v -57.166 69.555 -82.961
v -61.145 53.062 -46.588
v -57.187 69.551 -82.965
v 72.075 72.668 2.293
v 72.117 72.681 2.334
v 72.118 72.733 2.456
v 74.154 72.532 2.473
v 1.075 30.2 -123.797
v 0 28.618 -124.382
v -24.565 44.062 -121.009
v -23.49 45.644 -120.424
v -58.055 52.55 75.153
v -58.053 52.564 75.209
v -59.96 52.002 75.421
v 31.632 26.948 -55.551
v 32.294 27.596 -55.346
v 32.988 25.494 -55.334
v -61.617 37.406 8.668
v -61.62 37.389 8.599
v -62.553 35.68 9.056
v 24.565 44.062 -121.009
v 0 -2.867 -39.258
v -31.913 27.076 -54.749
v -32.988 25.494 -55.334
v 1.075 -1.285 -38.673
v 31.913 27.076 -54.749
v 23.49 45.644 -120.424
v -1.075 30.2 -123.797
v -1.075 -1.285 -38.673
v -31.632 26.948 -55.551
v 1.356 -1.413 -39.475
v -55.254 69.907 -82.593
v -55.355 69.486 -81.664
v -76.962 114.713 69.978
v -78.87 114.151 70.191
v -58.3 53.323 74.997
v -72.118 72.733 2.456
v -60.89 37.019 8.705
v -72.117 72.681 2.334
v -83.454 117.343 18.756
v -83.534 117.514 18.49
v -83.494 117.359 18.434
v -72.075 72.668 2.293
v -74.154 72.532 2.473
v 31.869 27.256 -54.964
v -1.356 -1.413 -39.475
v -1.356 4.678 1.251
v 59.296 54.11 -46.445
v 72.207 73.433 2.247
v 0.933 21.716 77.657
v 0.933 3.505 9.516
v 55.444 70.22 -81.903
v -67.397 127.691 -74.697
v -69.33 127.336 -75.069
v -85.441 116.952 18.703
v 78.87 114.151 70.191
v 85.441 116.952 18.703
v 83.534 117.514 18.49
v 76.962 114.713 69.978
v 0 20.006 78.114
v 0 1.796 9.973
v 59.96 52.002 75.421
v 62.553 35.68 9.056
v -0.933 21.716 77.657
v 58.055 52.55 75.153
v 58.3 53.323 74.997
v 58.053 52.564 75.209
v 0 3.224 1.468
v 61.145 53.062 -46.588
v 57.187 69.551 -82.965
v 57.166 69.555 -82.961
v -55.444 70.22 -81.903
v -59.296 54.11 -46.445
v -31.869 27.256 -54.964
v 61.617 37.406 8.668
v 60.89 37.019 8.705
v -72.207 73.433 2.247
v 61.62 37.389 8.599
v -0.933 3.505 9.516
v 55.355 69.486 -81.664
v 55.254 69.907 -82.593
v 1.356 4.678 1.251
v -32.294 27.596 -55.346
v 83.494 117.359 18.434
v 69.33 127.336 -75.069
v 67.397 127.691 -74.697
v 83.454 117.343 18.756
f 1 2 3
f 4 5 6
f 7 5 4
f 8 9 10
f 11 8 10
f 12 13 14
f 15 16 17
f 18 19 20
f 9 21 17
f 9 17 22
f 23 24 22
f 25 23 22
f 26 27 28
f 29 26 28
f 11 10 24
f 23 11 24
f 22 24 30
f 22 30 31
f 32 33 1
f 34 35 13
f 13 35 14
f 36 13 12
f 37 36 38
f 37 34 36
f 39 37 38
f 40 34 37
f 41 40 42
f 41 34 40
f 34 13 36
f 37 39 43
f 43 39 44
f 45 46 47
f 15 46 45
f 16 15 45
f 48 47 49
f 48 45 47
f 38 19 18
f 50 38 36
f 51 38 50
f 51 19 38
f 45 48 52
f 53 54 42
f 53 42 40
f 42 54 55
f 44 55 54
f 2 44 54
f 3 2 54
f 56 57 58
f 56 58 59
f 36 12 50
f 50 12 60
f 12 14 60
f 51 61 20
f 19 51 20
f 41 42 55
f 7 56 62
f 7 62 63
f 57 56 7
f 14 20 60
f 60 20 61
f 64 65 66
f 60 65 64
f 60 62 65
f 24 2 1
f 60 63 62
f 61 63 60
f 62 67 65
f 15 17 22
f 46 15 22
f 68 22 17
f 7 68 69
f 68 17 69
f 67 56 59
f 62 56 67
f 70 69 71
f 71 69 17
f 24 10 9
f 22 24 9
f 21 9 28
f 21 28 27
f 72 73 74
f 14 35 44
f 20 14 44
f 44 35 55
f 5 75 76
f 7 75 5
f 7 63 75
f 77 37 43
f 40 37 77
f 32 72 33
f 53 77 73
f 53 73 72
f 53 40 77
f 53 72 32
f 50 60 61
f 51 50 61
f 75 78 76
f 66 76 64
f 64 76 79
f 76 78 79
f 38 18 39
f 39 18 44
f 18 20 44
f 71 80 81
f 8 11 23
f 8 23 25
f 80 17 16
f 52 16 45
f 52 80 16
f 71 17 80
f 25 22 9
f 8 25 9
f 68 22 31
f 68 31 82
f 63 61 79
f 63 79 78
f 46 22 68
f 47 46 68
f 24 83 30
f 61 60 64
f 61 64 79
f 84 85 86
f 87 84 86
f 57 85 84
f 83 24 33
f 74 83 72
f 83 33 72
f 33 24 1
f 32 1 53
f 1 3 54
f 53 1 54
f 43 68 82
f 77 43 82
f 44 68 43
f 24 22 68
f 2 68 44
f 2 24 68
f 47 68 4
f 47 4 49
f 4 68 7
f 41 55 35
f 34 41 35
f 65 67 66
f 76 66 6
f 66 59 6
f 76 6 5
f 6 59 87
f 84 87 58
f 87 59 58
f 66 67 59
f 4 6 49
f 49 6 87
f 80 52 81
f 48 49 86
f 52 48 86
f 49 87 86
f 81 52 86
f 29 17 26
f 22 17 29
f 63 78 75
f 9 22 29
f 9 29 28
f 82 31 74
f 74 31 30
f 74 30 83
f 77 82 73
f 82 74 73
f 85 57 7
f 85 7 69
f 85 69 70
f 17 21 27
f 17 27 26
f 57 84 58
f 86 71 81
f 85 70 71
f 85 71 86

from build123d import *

# Parameters (mm, degrees)
BOSS_EXTRUDE1_DEPTH  = 2
BOSS_EXTRUDE2_DEPTH  = 2
BOSS_EXTRUDE3_DEPTH  = 2
BOSS_EXTRUDE4_DEPTH  = 2
BOSS_EXTRUDE5_DEPTH  = 2
BOSS_EXTRUDE11_DEPTH = 2


with BuildPart() as part:
    # Sketch3 → Boss-Extrude1 (new body)
    with BuildSketch(Plane(origin=(-0.346555838, -0.635169439, 0.169748229), x_dir=(0.8846275482433851, -0.4504883576630665, 0.12039244369531933), z_dir=(0.4662982960390243, 0.8546340716593914, -0.22839987449644675))):
        Polygon((-67.388202535, -86.290405408), (0.391753387, -80.63091609), (0.391753387, -10.098482667), (-70.319042991, -17.961416408), align=None)
    extrude(amount=BOSS_EXTRUDE1_DEPTH)



with BuildPart() as body_2:
    # Sketch5 → Boss-Extrude2 (new body)
    with BuildSketch(Plane(origin=(-56.35451769, -10.362612727, -10.830227939), x_dir=(0.18266051002357656, 0.033588081371868986, -0.9826021467856071), z_dir=(0.9663996352281745, 0.17770403455896827, 0.18572296877962188))):
        Polygon((-30.056447866, 130.475360148), (-13.538590304, 84.746354353), (36.390477752, 63.245242789), (73.411523815, 78.746769275), (65.375780796, 137.774420808), align=None)
    extrude(amount=BOSS_EXTRUDE2_DEPTH)


with BuildPart() as part_1:
    add(part.part)

    add(body_2.part)  # Boss-Extrude3 merges body 2
    # Sketch4 → Boss-Extrude3 (add)
    with BuildSketch(Plane(origin=(-48.24629982, -14.226608827, 5.383644926), x_dir=(0.10207726427725161, 0.030099993458726118, 0.994320985653756), z_dir=(-0.9537215923741782, -0.28122828227388286, 0.10642263616610528))):
        Polygon((65.177713076, 131.796906654), (70.437801909, 66.837017039), (3.69362899, 51.915356778), (-2.927449999, 90.54331453), (13.395731887, 136.34217175), align=None)
    extrude(amount=-BOSS_EXTRUDE3_DEPTH)

    # Sketch6 → Boss-Extrude4 (add)
    with BuildSketch(Plane(origin=(1.480799375, 1.587783801, -0.237470014), x_dir=(-0.7350655060210773, 0.6705381368478288, -0.10028613508666168), z_dir=(-0.6779960928043596, -0.7269797866087502, 0.10872758621582002))):
        Polygon((102.895181545, -13.174165852), (85.198045027, 38.226427476), (46.892200114, 50.954167672), (2.014513485, 39.25021901), (2.014513485, -1.928751345), align=None)
    extrude(amount=-BOSS_EXTRUDE4_DEPTH)

    # Sketch7 → Boss-Extrude5 (add)
    with BuildSketch(Plane(origin=(-19.399997247, -16.733859342, -9.71050635), x_dir=(0.26837311265933295, 0.23149064719993817, -0.9350871363998624), z_dir=(0.7080687682639505, 0.610759013089178, 0.3544178992933416))):
        Polygon((78.334992527, 90.006984524), (39.437055345, 80.117286778), (48.790397505, 40.850912927), align=None)
    extrude(amount=BOSS_EXTRUDE5_DEPTH)


with BuildPart() as body_2_2:
    # Sketch9 → Boss-Extrude11 (new body)
    with BuildSketch(Plane(origin=(-7.391063933, -10.877406216, -4.023277357), x_dir=(-0.8433068557681762, 0.5040578599076407, 0.1864382495083074), z_dir=(-0.5374323650603791, -0.7909375701930272, -0.29254779616800664))):
        Polygon((20.364698966, 128.780172412), (30.353097834, 60.7415241), (-8.7643826, 35.825426976), (-8.764379517, 126.585724452), align=None)
    extrude(amount=-BOSS_EXTRUDE11_DEPTH)


with BuildPart() as body_3:
    # Mirror1: mirrored copy
    add(part_1.part.mirror(Plane(origin=(0, 0, 0), x_dir=(0, 0, 1), z_dir=(1, 0, 0))))


with BuildPart() as body_4:
    # Mirror1 2: mirrored copy
    add(body_2_2.part.mirror(Plane(origin=(0, 0, 0), x_dir=(0, 0, 1), z_dir=(1, 0, 0))))


solid = Compound([part_1.part, body_2_2.part, body_3.part, body_4.part])
